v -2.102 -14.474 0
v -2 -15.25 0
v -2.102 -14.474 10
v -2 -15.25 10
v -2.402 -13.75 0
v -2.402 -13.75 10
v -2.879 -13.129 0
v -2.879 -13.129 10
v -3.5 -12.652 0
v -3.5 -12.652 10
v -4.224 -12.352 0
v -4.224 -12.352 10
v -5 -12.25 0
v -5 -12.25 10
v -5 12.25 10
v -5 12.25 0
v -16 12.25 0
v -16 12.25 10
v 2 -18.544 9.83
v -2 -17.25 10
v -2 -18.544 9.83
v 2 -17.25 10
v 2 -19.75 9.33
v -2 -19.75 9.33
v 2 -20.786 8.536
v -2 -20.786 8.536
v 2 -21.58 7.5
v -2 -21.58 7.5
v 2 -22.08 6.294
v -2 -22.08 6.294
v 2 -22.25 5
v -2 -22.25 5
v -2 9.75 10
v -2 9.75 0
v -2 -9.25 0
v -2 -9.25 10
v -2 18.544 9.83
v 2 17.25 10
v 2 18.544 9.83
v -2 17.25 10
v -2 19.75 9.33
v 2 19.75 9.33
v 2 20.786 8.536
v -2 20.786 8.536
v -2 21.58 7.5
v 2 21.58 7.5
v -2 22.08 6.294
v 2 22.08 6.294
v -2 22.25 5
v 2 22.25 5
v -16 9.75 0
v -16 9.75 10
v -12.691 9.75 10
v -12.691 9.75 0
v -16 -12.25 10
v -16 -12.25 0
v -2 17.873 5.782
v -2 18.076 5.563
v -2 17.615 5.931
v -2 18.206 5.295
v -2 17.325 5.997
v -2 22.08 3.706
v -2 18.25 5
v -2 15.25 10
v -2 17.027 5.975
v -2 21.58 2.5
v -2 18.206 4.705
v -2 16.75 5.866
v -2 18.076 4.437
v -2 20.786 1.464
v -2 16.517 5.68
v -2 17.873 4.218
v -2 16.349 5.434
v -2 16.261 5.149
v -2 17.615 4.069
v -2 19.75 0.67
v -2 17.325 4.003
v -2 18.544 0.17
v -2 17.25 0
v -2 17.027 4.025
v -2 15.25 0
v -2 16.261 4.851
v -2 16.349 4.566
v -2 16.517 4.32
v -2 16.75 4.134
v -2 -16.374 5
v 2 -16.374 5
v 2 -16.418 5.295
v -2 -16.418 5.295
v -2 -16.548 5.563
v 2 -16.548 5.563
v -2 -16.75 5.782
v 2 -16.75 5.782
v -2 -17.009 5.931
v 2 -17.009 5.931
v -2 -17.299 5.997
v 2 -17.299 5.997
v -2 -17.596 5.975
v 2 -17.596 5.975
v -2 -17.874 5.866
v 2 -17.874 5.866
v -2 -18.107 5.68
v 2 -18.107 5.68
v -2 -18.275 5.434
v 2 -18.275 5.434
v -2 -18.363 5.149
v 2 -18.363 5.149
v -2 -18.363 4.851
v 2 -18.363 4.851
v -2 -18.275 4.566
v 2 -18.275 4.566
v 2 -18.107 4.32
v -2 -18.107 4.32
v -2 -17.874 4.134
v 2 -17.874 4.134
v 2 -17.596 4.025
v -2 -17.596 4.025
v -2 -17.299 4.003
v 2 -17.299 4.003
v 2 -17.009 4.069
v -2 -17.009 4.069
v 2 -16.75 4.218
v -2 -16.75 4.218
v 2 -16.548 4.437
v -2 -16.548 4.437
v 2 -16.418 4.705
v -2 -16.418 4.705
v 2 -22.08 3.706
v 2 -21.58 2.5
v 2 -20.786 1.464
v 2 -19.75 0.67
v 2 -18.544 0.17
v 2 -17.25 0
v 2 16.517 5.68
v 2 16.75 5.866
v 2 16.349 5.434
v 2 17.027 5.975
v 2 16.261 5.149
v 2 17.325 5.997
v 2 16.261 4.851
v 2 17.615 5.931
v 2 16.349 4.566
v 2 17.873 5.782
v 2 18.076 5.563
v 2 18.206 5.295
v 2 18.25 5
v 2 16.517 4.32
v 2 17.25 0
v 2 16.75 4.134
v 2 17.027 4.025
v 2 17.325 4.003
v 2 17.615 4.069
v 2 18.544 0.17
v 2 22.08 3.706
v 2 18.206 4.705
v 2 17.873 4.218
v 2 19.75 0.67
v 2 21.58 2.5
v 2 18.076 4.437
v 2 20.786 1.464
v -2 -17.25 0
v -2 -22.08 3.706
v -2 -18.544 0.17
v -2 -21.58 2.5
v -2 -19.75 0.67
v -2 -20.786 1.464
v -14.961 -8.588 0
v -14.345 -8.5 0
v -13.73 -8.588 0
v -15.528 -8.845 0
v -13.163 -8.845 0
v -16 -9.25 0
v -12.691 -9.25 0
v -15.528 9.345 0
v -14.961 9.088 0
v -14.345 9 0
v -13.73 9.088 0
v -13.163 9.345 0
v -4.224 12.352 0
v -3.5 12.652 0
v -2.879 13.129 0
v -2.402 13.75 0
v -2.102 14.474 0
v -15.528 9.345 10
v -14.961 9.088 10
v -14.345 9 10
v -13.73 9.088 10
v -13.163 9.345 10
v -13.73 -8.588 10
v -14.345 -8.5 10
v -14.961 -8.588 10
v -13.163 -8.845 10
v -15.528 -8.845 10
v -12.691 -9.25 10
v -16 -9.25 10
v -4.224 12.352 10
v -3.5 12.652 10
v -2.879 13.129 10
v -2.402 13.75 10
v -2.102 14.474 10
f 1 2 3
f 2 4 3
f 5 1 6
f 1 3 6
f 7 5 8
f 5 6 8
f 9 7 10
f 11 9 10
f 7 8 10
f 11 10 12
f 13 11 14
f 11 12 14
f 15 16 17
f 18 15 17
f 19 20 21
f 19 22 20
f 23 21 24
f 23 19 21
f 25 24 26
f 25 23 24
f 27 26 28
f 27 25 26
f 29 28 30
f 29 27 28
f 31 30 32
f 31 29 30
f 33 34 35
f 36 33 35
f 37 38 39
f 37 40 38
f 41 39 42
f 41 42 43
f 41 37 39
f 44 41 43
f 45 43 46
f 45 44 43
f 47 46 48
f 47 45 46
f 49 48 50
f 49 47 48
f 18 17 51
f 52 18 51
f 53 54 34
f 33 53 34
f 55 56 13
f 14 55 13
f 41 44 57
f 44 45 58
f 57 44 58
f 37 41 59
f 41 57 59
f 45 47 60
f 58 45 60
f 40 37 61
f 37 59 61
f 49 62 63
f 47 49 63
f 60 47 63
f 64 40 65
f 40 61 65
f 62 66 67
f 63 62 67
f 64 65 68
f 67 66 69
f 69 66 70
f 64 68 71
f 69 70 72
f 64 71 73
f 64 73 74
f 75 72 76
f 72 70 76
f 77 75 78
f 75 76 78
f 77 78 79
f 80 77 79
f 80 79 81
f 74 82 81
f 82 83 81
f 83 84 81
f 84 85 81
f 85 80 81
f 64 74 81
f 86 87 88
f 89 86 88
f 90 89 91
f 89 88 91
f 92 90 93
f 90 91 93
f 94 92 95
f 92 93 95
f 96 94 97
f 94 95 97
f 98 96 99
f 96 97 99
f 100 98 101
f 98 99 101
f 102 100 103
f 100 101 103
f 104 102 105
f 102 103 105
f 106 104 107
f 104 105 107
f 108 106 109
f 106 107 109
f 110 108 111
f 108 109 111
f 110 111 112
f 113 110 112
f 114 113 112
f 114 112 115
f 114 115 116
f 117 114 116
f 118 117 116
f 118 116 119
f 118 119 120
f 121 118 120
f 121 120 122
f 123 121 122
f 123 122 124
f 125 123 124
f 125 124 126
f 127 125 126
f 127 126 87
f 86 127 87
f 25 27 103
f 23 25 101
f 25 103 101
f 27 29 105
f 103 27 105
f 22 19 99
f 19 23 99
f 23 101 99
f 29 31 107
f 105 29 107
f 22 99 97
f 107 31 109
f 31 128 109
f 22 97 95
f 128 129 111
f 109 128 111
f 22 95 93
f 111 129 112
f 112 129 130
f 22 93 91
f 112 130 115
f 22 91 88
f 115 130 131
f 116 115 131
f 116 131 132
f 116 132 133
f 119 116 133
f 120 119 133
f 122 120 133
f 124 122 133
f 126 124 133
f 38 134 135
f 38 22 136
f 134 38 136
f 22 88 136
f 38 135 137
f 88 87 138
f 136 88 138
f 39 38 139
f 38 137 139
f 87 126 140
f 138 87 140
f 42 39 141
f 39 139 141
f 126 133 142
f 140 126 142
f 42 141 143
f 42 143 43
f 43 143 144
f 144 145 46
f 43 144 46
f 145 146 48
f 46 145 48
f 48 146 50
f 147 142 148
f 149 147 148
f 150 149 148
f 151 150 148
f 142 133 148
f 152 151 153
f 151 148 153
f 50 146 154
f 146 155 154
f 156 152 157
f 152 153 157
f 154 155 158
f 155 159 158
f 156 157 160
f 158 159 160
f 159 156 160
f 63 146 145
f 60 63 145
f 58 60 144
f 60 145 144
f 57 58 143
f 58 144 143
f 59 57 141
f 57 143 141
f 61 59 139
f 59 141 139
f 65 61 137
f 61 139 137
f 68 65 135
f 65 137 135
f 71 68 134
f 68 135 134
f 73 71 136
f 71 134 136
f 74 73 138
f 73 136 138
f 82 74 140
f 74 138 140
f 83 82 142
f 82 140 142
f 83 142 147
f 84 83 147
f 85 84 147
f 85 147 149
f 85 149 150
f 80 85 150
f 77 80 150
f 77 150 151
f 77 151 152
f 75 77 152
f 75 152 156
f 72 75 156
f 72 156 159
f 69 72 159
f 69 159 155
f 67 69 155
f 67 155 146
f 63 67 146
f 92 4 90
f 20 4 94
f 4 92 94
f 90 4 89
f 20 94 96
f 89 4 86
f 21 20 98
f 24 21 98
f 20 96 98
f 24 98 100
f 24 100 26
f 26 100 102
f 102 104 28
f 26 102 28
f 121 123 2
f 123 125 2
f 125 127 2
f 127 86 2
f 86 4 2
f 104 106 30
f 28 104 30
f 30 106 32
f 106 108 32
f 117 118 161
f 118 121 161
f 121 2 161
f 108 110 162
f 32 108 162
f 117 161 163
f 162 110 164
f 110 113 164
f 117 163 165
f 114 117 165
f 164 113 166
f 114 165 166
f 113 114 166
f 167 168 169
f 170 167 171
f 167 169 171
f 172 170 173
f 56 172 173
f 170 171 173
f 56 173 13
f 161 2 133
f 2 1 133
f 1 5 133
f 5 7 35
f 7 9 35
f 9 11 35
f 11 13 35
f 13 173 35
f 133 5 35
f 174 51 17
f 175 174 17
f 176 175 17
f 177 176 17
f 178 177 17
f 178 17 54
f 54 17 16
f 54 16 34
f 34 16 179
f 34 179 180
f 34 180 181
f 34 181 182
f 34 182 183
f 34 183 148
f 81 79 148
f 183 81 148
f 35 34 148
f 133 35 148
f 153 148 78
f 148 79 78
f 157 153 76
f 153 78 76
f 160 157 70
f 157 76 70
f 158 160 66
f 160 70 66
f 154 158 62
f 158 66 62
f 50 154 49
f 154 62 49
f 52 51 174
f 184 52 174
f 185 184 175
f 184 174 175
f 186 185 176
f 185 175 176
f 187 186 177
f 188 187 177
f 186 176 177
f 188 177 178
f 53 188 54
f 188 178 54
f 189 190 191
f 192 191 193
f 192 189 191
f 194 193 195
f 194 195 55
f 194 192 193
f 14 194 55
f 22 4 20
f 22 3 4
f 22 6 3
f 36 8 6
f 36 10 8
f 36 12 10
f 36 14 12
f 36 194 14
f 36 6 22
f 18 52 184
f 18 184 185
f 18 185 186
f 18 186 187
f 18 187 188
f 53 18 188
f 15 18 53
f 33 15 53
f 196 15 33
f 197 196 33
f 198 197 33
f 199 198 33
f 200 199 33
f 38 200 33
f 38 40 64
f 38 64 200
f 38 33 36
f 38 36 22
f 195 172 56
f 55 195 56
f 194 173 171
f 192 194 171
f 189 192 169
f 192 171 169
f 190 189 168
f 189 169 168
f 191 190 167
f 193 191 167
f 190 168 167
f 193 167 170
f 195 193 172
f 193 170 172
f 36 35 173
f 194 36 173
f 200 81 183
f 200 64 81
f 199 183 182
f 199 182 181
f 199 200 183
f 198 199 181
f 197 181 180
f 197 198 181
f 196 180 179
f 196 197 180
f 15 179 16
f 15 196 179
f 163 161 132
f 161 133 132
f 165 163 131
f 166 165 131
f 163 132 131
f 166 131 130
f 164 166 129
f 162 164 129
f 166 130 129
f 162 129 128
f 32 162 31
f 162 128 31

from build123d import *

# Parameters (mm, degrees)
F1_DEPTH = 10
F3_D     = 2
F4_R     = 4.99999
F5_R     = 3


# Not quite as in the source:
# - a fillet or chamfer is up to 0.001 mm smaller than in the source, because OpenCascade refuses the exact size
# - a feature names something its author has since deleted; it is built from what else it names


with BuildPart() as f1:
    # F0 (on Top) → F1 (new body)
    with BuildSketch(Plane.XY):
        with BuildLine():
            Line((-12.6909215784, 9.75), (-16, 9.75))
            ThreePointArc((-16, 9.75), (-14.3454607892, 9), (-12.6909215784, 9.75))
        make_face()
        Polygon((2, -22.25), (2, -12.25), (2, 12.25), (2, 22.25), (-2, 22.25), (-2, 12.25), (-16, 12.25), (-16, 9.75), (-12.6909215784, 9.75), (-2, 9.75), (-2, -9.25), (-12.6909215784, -9.25), (-16, -9.25), (-16, -12.25), (-2, -12.25), (-2, -22.25), align=None)
        with BuildLine():
            ThreePointArc((-12.6909215784, -9.25), (-14.3454607892, -8.5), (-16, -9.25))
            Line((-16, -9.25), (-12.6909215784, -9.25))
        make_face()
    extrude(amount=F1_DEPTH)

    # F3 (through all)
    with Locations(Plane(origin=(-2, 0, 0), x_dir=(0, -1, 0), z_dir=(-1, 0, 0))):
        with Locations((-17.25, 5), (17.3738710582, 5)):
            Hole(F3_D / 2)

    # F4 (radius 5 in the source; OpenCascade refuses exactly that, so slightly less here)
    f4_edges = [f1.edges().sort_by_distance(p)[0] for p in [
        (0, 22.25, 10),
        (0, -22.25, 10),
        (0, -22.25, 0),
        (0, 22.25, 0),
    ]]
    fillet(f4_edges, radius=F4_R)

    # F5
    f5_edges = [f1.edges().sort_by_distance(p)[0] for p in [
        (-2, 12.25, 5),
        (-2, -12.25, 5),
    ]]
    fillet(f5_edges, radius=F5_R)


solid = f1.part
